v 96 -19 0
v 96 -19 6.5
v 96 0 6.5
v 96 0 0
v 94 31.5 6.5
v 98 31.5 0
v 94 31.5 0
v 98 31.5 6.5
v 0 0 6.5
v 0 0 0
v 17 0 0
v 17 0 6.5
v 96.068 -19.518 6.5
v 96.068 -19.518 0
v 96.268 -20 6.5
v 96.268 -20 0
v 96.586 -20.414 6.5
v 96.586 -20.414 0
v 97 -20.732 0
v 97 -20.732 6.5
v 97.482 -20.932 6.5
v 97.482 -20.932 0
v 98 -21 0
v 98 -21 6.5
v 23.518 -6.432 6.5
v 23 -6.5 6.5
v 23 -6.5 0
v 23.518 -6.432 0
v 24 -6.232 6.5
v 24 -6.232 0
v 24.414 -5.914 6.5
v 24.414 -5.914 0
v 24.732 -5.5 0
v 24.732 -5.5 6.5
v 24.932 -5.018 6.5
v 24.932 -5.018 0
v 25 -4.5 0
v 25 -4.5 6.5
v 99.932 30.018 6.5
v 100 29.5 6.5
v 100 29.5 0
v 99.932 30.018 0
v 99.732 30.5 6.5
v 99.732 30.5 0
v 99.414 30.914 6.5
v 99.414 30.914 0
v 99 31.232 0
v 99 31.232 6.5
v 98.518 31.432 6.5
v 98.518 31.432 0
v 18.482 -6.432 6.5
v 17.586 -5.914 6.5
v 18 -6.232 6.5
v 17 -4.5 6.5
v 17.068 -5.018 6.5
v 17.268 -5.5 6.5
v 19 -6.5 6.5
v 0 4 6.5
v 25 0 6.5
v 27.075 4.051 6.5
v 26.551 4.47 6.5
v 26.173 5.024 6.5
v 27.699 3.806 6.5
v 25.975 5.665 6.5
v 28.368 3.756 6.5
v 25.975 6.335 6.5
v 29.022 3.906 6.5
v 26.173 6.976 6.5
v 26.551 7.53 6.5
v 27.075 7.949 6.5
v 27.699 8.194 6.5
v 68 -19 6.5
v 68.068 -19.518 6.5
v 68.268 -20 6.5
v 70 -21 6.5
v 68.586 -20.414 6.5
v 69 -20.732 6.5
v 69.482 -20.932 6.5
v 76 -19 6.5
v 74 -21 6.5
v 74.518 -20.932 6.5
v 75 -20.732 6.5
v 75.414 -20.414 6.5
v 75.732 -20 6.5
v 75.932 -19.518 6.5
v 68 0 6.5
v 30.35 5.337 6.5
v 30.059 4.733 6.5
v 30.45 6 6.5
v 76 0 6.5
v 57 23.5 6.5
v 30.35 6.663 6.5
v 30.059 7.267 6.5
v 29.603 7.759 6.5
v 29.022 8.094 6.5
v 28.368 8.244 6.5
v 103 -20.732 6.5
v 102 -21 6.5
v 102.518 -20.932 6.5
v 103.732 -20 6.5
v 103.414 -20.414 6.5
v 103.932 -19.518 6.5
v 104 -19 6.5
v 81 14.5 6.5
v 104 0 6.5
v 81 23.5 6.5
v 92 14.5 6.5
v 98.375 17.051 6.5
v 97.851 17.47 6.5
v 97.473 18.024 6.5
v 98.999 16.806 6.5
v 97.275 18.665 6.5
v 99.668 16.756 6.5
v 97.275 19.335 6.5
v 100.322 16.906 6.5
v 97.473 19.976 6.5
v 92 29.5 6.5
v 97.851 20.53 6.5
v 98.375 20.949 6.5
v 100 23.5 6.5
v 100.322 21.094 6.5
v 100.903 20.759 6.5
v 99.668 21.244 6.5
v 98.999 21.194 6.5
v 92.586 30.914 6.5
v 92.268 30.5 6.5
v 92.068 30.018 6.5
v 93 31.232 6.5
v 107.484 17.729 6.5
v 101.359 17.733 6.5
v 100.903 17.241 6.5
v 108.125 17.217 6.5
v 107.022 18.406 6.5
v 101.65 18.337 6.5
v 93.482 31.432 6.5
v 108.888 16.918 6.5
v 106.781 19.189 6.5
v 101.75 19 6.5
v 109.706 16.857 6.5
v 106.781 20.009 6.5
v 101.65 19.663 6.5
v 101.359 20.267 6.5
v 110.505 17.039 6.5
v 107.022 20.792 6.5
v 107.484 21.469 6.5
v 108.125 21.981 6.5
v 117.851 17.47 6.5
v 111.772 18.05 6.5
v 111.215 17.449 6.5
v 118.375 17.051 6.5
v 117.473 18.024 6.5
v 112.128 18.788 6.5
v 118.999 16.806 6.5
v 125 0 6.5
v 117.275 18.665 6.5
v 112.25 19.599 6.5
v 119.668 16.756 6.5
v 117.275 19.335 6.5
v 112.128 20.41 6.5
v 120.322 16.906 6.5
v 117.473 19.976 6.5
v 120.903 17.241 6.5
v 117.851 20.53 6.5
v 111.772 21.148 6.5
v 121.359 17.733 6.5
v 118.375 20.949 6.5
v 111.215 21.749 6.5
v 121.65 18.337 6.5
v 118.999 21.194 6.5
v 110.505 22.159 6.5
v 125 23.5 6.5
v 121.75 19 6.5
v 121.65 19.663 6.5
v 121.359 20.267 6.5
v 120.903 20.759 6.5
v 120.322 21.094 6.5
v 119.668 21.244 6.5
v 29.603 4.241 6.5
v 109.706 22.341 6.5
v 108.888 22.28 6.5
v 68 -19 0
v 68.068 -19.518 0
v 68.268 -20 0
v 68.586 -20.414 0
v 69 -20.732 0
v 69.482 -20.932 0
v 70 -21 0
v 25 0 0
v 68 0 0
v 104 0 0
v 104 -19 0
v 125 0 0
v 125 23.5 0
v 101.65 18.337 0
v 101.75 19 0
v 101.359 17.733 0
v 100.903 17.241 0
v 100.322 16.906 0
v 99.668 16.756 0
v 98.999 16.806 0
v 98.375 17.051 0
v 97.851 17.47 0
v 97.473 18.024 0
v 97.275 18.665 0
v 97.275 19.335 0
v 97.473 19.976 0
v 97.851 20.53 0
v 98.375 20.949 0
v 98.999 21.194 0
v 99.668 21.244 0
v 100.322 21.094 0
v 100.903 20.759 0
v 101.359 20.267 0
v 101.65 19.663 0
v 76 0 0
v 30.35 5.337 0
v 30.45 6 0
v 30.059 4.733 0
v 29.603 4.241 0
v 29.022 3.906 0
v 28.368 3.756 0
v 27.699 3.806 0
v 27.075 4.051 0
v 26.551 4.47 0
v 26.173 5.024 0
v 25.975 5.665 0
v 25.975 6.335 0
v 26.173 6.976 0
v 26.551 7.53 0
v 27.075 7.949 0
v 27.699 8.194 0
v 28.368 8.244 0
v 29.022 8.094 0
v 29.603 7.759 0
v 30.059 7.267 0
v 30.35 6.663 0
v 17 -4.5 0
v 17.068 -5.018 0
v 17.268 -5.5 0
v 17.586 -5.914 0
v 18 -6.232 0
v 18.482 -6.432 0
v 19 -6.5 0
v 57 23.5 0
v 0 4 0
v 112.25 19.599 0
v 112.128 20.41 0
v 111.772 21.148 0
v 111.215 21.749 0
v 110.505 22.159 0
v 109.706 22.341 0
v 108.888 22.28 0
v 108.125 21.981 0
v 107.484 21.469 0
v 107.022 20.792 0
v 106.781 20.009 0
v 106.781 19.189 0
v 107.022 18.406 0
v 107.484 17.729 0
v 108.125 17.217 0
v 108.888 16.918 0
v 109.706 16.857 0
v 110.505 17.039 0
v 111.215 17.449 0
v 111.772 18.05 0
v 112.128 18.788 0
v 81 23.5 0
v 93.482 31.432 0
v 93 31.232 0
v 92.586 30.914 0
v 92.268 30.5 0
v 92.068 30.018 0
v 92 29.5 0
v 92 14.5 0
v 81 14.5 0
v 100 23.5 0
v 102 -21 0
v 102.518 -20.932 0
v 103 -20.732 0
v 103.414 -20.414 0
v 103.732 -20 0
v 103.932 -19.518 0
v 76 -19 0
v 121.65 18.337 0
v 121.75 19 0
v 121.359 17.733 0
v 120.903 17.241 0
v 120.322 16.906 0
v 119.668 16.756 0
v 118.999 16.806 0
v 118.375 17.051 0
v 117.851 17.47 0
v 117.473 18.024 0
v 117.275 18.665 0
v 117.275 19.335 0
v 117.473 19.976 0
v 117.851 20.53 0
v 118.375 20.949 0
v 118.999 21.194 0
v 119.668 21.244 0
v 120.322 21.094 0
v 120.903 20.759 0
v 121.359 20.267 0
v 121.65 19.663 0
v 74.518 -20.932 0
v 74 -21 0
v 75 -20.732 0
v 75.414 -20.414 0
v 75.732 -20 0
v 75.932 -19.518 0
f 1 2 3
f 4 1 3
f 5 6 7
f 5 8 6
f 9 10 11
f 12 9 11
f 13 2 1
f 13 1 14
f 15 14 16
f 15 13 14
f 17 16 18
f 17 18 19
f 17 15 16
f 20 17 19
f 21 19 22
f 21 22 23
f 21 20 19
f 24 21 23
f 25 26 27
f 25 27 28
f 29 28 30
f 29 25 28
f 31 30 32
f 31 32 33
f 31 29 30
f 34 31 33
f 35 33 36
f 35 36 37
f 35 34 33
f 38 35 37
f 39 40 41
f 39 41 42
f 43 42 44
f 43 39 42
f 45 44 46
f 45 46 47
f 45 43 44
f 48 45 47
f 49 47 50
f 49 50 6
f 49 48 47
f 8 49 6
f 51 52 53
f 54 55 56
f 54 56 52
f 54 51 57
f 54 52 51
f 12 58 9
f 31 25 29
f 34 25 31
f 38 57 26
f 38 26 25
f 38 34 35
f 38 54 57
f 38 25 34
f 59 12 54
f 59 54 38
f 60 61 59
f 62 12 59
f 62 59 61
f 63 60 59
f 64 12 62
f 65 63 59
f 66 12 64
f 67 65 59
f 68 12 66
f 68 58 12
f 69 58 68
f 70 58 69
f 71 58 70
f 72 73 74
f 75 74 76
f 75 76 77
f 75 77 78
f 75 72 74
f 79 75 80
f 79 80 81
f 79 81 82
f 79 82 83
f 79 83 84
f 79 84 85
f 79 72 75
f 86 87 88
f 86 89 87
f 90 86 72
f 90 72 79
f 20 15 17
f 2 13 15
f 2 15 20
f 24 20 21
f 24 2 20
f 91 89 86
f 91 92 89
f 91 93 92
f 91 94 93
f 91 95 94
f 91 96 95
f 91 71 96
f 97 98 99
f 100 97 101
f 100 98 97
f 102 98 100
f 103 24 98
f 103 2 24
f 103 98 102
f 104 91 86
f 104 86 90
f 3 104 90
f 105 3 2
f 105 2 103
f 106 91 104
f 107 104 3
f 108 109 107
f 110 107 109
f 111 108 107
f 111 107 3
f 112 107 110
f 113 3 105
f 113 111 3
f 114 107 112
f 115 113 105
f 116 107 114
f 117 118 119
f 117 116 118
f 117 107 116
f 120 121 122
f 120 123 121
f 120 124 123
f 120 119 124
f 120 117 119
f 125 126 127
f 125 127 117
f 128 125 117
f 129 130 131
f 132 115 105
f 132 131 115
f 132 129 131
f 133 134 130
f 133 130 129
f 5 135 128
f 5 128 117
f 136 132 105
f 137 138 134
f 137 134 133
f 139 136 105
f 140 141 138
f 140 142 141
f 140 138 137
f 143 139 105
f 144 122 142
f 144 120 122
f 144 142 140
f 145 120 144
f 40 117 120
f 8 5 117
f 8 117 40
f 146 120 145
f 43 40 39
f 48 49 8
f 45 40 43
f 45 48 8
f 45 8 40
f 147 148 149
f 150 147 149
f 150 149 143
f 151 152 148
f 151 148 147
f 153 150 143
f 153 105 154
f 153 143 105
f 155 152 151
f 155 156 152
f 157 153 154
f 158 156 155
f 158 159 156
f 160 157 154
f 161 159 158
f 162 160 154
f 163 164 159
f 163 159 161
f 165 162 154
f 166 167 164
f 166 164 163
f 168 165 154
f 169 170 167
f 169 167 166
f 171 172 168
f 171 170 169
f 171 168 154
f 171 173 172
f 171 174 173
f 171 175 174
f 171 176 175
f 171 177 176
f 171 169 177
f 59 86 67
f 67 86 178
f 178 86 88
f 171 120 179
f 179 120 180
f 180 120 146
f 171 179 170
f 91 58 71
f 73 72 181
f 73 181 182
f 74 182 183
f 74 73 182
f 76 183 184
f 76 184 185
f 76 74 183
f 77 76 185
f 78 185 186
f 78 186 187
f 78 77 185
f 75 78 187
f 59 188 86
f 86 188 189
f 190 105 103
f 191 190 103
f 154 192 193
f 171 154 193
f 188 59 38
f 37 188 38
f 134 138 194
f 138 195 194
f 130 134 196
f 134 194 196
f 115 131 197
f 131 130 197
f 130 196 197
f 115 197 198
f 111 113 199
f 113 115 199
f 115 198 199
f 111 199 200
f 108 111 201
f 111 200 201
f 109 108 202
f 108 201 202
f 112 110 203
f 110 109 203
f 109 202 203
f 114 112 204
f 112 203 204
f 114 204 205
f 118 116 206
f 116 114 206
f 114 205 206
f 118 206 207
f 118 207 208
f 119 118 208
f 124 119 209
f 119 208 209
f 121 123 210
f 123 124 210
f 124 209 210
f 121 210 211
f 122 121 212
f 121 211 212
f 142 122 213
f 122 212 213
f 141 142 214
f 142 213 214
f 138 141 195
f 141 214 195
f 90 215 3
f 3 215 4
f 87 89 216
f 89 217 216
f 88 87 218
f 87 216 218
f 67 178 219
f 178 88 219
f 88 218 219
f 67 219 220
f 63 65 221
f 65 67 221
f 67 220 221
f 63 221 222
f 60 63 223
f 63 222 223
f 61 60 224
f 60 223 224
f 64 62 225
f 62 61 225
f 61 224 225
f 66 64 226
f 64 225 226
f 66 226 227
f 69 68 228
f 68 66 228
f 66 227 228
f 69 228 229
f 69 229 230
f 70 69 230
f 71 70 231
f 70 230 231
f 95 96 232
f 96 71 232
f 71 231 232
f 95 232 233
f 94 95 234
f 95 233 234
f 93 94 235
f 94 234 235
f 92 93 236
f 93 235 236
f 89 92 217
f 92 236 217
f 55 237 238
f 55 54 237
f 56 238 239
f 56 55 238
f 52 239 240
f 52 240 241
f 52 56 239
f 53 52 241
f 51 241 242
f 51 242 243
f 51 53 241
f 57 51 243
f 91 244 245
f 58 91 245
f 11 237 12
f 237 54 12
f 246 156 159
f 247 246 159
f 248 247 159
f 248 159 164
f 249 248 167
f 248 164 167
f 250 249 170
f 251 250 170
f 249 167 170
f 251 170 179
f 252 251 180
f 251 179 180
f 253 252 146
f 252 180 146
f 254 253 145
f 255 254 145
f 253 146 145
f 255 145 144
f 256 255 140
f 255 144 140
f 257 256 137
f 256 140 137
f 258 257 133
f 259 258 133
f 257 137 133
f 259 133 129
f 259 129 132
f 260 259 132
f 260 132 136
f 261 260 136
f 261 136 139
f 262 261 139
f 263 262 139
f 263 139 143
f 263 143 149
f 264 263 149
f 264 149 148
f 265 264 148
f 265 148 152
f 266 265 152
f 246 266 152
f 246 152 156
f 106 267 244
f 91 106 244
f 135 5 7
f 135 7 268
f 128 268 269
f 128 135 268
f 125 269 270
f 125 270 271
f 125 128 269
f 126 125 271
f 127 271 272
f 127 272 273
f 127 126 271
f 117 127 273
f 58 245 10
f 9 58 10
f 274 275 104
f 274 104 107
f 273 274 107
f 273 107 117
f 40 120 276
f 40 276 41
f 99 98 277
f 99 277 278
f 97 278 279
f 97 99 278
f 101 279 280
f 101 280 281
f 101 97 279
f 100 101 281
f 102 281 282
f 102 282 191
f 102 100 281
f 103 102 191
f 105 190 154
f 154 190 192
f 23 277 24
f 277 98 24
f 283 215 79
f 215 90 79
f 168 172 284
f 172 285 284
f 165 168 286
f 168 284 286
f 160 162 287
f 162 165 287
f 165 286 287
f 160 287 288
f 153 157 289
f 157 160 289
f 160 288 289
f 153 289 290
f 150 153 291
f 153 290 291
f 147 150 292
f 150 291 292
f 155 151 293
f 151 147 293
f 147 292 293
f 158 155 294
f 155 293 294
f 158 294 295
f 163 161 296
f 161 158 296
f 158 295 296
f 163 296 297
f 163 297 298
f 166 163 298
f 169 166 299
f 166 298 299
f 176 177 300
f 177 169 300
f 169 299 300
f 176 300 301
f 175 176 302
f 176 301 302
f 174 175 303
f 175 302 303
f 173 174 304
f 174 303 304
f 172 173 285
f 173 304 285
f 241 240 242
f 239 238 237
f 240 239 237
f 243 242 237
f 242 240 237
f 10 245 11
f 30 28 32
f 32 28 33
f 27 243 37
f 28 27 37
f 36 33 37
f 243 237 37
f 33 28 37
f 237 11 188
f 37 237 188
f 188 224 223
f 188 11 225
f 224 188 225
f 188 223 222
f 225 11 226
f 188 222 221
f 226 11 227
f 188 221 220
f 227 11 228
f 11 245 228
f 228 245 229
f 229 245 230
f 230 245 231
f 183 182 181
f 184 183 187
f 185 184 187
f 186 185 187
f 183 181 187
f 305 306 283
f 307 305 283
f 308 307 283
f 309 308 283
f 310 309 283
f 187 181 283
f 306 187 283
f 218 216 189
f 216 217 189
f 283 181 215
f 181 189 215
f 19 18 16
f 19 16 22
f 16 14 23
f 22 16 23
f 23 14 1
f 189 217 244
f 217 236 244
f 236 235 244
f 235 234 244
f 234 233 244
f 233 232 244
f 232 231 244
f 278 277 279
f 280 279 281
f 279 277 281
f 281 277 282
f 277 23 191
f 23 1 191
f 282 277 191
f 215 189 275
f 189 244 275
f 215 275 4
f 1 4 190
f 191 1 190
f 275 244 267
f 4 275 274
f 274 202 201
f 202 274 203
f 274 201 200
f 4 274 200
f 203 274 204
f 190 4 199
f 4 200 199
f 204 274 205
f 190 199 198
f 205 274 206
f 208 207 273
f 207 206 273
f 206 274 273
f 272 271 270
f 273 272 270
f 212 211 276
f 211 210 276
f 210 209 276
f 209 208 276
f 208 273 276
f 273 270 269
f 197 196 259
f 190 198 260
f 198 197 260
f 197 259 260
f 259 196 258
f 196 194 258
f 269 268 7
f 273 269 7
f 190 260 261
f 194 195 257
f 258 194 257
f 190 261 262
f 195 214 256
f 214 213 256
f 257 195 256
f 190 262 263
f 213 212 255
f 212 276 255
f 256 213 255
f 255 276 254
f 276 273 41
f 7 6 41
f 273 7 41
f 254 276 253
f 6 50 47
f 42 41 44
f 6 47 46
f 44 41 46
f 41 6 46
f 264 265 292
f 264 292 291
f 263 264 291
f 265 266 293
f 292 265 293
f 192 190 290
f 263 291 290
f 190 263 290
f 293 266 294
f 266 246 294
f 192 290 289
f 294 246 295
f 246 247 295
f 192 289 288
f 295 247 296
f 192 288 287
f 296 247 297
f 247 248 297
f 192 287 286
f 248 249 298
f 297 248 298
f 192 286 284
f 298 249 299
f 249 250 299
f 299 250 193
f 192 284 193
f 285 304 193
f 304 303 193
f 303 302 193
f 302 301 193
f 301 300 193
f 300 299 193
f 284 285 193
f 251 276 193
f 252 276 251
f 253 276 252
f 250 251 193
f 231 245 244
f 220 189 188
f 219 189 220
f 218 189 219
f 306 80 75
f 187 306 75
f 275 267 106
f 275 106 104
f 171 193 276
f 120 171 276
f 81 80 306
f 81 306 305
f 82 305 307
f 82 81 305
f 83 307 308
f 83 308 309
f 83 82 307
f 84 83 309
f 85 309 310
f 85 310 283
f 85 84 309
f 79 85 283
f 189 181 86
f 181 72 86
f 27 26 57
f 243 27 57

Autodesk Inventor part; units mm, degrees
ref_plane "YZ Plane" through (0, 0, 0) normal (1, 0, 0) x (0, 1, 0)
ref_plane "XZ Plane" through (0, 0, 0) normal (0, 1, 0) x (-1, 0, 0)
ref_plane "XY Plane" through (0, 0, 0) normal (0, 0, 1) x (1, 0, 0)
sketch "Sketch1" plane through (0, 0, 0) normal (0, 0, 1) x (1, 0, 0)
  line L0 (0, 4) -> (0, 0)
  line L1 (0, 0) -> (125, 0)
  line L2 (125, 0) -> (125, 23.5)
  line L3 (57, 23.5) -> (0, 4)
  line L4 (81, 23.5) -> (81, 14.5)
  line L5 (81, 14.5) -> (92, 14.5)
  line L6 (92, 14.5) -> (92, 23.5)
  line L7 (125, 23.5) -> (92, 23.5)
  line L8 (81, 23.5) -> (57, 23.5)
  circle A0 centre (99.5, 19) radius 2.25
  circle A1 centre (119.5, 19) radius 2.25
  circle A2 centre (28.2, 6) radius 2.25
  circle A3 centre (28.2, 6) radius 4.5 construction
  point P0 (92, 19)
  dimension "d0" = 4
  dimension "d1" = 125
  dimension "d2" = 9
  dimension "d3" = 11
  dimension "d4" = 33
  dimension "d5" = 24
  dimension "d6" = 23.5
  dimension "d7" = 4.5
  dimension "d8" = 4.5
  dimension "d9" = 5.5
  dimension "d10" = 20
  dimension "d11" = 4.5
  dimension "d12" = 9
  dimension "d13" = 6
  dimension "d14" = 28.2
extrude "Extrusion1" add sketch "Sketch1" along normal blind 6.5
sketch "Sketch2" plane through (0, 0, 6.5) normal (0, 0, 1) x (1, 0, 0)
  line L0 (0, 0) -> (125, 0) projected
  line L1 (125, 23.5) -> (92, 23.5) projected
  line L2 (17, 0) -> (25, 0)
  line L3 (25, 0) -> (25, -4.5)
  line L4 (23, -6.5) -> (19, -6.5)
  line L5 (17, -4.5) -> (17, 0)
  line L6 (96, 0) -> (104, 0)
  line L7 (104, 0) -> (104, -19)
  line L8 (102, -21) -> (98, -21)
  line L9 (96, -19) -> (96, 0)
  line L10 (68, 0) -> (76, 0)
  line L11 (76, 0) -> (76, -19)
  line L12 (74, -21) -> (70, -21)
  line L13 (68, -19) -> (68, 0)
  line L14 (92, 23.5) -> (100, 23.5)
  line L15 (100, 23.5) -> (100, 29.5)
  line L16 (98, 31.5) -> (94, 31.5)
  line L17 (92, 29.5) -> (92, 23.5)
  arc A0 (17, -4.5) -> (19, -6.5) centre (19, -4.5) ccw
  arc A1 (23, -6.5) -> (25, -4.5) centre (23, -4.5) ccw
  arc A2 (96, -19) -> (98, -21) centre (98, -19) ccw
  arc A3 (102, -21) -> (104, -19) centre (102, -19) ccw
  arc A4 (68, -19) -> (70, -21) centre (70, -19) ccw
  arc A5 (74, -21) -> (76, -19) centre (74, -19) ccw
  arc A6 (94, 31.5) -> (92, 29.5) centre (94, 29.5) ccw
  arc A7 (100, 29.5) -> (98, 31.5) centre (98, 29.5) ccw
  line L18 (92, 23.5) -> (92, 14.5) projected
  dimension "d17" = 2
  dimension "d18" = 17
  dimension "d20" = 8
  dimension "d21" = 8
  dimension "d22" = 8
  dimension "d24" = 6.5
  dimension "d25" = 43
  dimension "d26" = 20
  dimension "d29" = 8
  dimension "d40" = 8
  dimension "d41" = 2
  dimension "d42" = 2
  dimension "d45" = 21
sketch "Sketch3" plane through (0, 0, 6.5) normal (0, 0, 1) x (1, 0, 0)
  circle A0 centre (119.5, 19) radius 2.25 projected
  circle A1 centre (109.5, 19.599) radius 2.75
  circle A2 centre (86.5, 19.599) radius 7.5 construction
  dimension "d35" = 5.5
  dimension "d36" = 15
  dimension "d37" = 10
extrude "Extrusion3" cut sketch "Sketch3" against normal blind 6.5 contours A1
extrude "Extrusion4" add sketch "Sketch2" against normal blind 6.5
properties part number "x_motor_upper_nut_stop" material "Plywood, Finish"
